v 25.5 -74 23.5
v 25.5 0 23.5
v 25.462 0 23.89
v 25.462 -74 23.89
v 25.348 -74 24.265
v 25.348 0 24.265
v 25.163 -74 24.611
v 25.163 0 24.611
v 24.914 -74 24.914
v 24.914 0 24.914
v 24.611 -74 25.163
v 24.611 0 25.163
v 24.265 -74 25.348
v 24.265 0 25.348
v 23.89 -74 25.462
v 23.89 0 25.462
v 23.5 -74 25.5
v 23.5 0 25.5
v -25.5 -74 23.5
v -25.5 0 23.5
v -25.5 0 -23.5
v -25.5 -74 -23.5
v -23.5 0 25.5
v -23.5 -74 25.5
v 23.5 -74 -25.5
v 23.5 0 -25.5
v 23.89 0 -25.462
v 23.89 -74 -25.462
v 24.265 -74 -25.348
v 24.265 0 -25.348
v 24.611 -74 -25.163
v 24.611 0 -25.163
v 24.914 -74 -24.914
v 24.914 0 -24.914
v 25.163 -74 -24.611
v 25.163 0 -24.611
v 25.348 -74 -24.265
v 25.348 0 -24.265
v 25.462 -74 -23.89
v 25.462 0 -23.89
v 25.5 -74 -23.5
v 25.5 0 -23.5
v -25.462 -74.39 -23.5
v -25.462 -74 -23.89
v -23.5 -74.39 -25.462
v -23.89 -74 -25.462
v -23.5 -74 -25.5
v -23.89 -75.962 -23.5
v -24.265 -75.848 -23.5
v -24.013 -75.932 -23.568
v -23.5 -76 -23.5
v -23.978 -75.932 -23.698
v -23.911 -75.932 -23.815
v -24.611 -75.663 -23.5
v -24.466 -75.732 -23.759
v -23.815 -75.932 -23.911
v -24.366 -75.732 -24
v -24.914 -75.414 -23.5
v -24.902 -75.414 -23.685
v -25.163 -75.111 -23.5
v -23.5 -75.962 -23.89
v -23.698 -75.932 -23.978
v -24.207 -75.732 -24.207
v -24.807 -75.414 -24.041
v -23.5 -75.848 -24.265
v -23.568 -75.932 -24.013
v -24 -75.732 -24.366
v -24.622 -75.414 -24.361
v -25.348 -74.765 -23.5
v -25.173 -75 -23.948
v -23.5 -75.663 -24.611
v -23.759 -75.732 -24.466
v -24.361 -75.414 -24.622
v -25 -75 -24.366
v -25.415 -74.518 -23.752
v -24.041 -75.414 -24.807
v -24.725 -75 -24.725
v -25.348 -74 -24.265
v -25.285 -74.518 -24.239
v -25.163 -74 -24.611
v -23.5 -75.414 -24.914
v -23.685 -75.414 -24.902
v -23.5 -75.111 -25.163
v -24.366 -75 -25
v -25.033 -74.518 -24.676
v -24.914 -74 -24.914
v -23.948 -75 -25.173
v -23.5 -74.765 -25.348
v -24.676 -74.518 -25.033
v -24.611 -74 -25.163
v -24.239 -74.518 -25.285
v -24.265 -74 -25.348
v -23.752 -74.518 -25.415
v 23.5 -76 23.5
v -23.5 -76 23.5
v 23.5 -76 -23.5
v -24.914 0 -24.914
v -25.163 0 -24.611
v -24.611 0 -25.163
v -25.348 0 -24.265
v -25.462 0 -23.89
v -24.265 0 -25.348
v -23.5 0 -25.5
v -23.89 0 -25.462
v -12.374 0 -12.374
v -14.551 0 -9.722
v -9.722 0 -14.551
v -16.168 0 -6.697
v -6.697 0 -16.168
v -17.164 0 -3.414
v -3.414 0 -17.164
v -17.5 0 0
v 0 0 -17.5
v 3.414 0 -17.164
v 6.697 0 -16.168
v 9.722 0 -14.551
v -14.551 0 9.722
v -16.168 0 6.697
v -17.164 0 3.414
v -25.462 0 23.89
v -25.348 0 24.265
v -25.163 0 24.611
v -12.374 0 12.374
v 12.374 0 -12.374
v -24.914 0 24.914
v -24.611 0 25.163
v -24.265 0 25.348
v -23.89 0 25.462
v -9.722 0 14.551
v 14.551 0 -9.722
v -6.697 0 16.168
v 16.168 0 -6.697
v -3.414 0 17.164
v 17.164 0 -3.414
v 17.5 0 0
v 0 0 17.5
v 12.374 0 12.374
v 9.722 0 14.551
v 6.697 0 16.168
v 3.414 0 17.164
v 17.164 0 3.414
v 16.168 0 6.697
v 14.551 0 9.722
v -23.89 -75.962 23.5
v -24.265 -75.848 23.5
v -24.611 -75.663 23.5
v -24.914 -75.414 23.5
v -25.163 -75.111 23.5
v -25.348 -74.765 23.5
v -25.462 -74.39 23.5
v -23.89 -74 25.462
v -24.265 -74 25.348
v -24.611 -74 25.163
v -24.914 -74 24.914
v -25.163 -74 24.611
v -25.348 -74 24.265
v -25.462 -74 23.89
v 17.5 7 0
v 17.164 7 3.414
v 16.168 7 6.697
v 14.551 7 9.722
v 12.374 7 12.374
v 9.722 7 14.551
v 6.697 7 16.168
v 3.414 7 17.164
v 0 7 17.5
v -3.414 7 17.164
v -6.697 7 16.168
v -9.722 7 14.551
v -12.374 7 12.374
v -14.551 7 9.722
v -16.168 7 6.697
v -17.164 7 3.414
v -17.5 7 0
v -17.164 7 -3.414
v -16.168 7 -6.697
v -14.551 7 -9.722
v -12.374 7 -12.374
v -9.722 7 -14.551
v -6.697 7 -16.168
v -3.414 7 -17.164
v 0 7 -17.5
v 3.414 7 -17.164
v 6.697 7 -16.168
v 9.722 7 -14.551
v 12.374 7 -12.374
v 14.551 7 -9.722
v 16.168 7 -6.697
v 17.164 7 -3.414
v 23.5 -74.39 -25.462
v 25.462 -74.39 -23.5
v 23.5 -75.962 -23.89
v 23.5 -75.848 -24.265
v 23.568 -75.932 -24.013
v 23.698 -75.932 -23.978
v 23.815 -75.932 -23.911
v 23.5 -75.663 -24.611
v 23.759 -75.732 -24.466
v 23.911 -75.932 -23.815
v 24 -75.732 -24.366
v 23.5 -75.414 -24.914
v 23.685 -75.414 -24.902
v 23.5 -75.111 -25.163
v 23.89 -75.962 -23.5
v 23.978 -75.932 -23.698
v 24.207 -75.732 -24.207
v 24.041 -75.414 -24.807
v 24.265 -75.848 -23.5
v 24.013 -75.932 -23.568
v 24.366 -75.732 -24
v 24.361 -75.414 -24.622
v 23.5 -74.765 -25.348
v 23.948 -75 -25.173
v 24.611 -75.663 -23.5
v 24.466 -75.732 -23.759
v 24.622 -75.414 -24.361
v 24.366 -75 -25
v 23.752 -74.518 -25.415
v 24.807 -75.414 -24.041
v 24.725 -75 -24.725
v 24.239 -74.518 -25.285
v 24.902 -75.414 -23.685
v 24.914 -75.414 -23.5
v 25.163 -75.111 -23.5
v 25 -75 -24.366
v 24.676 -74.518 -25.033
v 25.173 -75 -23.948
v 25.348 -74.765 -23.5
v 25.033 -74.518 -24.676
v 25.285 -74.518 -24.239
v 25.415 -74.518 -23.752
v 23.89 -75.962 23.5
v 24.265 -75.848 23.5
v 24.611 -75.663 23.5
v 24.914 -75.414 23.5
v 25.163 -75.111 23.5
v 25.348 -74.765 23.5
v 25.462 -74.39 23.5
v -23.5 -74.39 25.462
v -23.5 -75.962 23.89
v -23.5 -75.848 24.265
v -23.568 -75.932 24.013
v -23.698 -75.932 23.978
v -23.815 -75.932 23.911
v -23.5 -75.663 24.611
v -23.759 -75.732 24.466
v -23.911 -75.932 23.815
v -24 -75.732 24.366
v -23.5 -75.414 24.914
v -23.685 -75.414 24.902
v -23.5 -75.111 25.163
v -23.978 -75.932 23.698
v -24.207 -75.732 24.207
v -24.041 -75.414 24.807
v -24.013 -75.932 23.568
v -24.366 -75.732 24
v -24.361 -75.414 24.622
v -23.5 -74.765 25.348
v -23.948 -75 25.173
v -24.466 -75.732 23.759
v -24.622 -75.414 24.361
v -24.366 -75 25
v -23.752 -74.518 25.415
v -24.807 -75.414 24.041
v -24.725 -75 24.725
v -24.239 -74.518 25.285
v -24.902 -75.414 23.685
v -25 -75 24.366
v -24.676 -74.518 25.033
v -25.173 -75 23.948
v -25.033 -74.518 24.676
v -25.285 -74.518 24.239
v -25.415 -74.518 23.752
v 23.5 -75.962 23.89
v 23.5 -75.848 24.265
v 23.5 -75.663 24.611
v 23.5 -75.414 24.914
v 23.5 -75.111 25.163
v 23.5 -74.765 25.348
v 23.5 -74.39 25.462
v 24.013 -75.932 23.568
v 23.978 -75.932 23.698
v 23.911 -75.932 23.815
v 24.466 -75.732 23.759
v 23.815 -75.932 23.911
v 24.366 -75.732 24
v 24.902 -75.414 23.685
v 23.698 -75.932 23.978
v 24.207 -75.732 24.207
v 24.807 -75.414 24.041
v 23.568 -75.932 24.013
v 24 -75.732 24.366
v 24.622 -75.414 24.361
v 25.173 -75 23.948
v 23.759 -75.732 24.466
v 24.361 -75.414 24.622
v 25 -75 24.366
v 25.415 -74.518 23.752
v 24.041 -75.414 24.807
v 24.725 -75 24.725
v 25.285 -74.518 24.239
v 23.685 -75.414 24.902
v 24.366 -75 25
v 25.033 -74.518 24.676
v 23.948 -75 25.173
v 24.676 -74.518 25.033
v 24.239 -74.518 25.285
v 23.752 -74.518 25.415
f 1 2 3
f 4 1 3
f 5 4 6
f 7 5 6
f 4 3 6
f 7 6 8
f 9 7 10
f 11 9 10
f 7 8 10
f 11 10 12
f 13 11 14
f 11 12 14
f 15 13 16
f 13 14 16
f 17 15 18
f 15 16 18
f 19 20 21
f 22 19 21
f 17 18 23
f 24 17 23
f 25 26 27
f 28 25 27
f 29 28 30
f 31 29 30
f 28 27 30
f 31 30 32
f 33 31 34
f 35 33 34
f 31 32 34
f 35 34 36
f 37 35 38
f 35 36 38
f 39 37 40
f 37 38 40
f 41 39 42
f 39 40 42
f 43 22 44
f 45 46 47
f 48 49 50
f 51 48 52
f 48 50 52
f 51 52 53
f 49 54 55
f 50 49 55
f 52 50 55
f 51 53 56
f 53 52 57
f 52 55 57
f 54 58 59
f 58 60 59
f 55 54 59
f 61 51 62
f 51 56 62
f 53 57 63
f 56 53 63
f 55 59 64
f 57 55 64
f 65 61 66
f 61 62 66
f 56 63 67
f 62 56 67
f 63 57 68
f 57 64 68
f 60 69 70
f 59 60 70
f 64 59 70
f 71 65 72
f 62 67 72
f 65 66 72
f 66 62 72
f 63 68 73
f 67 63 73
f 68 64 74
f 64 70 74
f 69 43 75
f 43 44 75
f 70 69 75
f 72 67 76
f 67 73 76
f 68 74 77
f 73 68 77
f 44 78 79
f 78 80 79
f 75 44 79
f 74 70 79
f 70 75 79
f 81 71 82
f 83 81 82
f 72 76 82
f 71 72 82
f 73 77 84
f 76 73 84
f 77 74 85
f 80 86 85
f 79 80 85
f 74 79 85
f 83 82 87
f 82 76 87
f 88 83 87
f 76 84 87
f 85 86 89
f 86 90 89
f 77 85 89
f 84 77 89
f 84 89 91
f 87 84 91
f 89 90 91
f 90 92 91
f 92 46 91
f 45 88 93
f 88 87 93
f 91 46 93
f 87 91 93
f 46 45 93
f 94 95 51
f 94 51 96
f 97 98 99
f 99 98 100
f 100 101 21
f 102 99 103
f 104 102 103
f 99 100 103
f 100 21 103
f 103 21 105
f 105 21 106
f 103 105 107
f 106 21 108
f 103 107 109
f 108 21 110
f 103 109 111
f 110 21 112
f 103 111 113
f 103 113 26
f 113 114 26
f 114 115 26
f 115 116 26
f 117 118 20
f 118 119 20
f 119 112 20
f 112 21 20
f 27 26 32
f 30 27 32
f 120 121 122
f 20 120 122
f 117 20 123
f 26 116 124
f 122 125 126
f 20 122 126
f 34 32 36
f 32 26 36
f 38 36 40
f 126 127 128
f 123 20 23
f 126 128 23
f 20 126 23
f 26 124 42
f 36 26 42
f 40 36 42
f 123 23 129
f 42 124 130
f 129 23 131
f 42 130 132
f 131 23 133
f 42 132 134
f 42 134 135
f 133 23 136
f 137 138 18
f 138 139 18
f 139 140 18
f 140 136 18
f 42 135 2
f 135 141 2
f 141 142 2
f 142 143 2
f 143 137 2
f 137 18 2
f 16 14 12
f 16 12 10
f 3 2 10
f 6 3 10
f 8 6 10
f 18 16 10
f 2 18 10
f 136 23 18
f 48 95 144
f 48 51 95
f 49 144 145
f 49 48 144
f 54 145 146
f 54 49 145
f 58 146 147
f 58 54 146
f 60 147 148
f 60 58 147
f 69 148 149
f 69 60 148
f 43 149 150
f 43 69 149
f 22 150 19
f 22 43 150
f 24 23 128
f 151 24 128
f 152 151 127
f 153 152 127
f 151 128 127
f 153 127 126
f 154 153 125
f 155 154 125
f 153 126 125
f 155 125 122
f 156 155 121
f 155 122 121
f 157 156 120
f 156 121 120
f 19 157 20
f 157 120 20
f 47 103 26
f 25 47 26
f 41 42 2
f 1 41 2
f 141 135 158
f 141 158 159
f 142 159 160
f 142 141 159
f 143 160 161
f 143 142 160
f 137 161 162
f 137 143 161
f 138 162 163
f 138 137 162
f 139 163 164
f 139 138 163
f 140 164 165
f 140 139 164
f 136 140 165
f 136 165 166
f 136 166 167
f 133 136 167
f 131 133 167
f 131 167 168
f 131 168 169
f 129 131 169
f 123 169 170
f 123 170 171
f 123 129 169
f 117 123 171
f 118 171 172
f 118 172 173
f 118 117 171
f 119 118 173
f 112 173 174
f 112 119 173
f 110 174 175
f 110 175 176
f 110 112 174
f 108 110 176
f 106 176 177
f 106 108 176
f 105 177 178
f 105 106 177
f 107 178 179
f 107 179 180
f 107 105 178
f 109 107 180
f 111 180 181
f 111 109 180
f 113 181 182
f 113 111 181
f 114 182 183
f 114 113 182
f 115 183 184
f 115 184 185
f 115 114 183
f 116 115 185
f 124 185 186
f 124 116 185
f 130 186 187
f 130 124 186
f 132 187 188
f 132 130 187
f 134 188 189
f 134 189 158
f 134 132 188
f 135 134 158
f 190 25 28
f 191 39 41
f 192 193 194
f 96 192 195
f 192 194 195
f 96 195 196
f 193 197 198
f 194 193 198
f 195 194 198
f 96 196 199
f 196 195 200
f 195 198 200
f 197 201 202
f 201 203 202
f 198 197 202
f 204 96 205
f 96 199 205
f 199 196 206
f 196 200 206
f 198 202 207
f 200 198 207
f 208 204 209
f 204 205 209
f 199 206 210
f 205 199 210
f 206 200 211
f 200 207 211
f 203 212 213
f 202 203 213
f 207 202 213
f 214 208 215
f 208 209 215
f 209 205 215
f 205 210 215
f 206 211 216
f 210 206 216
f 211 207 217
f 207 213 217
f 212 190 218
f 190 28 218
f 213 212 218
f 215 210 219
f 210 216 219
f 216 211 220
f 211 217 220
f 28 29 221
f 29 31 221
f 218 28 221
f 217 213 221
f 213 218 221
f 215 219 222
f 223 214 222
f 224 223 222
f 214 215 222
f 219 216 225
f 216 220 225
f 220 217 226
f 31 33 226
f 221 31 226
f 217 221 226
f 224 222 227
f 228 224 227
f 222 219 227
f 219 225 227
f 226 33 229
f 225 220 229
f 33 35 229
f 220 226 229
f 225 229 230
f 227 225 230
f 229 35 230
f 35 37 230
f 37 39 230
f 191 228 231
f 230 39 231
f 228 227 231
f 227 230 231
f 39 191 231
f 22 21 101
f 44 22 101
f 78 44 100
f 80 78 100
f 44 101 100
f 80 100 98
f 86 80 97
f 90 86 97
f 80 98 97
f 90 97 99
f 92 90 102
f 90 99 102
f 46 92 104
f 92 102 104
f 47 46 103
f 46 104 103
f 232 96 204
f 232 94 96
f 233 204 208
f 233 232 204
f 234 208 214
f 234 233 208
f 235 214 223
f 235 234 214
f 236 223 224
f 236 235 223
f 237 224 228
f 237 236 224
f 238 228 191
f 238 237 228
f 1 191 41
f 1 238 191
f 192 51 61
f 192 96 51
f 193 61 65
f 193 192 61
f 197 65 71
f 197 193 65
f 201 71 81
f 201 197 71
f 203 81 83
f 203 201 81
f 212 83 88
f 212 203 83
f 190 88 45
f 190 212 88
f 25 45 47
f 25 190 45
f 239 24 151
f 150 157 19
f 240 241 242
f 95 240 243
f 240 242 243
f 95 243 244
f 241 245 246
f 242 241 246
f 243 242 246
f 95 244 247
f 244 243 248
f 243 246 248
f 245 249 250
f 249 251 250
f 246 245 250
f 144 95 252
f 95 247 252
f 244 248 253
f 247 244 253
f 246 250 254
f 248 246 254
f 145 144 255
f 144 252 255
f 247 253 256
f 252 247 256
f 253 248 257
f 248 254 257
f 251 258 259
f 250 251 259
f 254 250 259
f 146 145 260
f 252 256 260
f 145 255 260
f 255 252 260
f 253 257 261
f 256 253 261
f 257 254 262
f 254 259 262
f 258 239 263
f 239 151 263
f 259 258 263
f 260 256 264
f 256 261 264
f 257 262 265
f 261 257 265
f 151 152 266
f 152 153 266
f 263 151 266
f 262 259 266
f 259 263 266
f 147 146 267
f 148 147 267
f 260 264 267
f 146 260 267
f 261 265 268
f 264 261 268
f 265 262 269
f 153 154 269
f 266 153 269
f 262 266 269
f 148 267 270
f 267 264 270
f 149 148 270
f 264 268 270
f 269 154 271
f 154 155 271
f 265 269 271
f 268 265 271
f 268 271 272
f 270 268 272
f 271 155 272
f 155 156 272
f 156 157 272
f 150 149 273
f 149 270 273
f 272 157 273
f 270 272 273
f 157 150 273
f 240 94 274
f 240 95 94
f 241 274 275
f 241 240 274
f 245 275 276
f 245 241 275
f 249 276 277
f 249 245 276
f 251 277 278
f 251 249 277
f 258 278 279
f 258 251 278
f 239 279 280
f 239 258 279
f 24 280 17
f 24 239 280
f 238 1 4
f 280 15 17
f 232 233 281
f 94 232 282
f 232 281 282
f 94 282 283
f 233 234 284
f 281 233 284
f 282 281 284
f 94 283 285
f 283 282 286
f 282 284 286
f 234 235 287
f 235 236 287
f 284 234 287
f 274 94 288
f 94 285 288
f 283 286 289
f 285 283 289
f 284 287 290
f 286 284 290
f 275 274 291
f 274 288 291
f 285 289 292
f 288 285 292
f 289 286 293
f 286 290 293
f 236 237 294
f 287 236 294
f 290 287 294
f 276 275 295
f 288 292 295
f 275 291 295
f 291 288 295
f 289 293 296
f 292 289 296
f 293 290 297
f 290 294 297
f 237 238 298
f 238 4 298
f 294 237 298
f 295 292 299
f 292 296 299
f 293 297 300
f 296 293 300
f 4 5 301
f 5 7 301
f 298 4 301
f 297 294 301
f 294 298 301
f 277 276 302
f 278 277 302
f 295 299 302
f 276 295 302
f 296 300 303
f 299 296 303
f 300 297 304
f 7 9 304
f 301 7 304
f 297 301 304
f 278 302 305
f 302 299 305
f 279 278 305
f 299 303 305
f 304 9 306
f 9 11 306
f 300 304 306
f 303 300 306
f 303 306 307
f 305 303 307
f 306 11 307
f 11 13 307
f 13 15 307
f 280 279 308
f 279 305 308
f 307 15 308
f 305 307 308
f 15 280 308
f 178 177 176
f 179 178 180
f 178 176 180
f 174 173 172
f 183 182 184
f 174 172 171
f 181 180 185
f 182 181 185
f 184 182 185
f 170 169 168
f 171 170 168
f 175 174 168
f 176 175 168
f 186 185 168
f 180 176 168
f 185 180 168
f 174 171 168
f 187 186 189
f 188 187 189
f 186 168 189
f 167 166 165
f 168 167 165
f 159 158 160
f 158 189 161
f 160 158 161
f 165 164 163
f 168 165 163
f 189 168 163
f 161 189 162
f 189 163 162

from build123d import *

# Parameters (mm, degrees)
F0_R     = 17.5
F1_DEPTH = 76
F2_DEPTH = 7
F3_R     = 2


with BuildPart() as f1:
    # F0 (on Front) → F1 (new body)
    with BuildSketch(Plane.XZ):
        with BuildLine():
            Line((23.5, 25.5), (-23.5, 25.5))
            ThreePointArc((-23.5, 25.5), (-24.9142135624, 24.9142135624), (-25.5, 23.5))
            Line((-25.5, 23.5), (-25.5, -23.5))
            ThreePointArc((-25.5, -23.5), (-24.9142135624, -24.9142135624), (-23.5, -25.5))
            Line((-23.5, -25.5), (23.5, -25.5))
            ThreePointArc((23.5, -25.5), (24.9142135624, -24.9142135624), (25.5, -23.5))
            Line((25.5, -23.5), (25.5, 23.5))
            ThreePointArc((25.5, 23.5), (24.9142135624, 24.9142135624), (23.5, 25.5))
        make_face()
        Circle(F0_R, mode=Mode.SUBTRACT)
        Circle(F0_R)
    extrude(amount=F1_DEPTH)

    # F0 (on Front) → F2 (join)
    with BuildSketch(Plane.XZ):
        Circle(F0_R)
    extrude(amount=-F2_DEPTH)

    # F3
    f3_edges = [f1.edges().sort_by_distance(p)[0] for p in [
        (25.5, -76, 0),
    ]]
    fillet(f3_edges, radius=F3_R)


solid = f1.part
